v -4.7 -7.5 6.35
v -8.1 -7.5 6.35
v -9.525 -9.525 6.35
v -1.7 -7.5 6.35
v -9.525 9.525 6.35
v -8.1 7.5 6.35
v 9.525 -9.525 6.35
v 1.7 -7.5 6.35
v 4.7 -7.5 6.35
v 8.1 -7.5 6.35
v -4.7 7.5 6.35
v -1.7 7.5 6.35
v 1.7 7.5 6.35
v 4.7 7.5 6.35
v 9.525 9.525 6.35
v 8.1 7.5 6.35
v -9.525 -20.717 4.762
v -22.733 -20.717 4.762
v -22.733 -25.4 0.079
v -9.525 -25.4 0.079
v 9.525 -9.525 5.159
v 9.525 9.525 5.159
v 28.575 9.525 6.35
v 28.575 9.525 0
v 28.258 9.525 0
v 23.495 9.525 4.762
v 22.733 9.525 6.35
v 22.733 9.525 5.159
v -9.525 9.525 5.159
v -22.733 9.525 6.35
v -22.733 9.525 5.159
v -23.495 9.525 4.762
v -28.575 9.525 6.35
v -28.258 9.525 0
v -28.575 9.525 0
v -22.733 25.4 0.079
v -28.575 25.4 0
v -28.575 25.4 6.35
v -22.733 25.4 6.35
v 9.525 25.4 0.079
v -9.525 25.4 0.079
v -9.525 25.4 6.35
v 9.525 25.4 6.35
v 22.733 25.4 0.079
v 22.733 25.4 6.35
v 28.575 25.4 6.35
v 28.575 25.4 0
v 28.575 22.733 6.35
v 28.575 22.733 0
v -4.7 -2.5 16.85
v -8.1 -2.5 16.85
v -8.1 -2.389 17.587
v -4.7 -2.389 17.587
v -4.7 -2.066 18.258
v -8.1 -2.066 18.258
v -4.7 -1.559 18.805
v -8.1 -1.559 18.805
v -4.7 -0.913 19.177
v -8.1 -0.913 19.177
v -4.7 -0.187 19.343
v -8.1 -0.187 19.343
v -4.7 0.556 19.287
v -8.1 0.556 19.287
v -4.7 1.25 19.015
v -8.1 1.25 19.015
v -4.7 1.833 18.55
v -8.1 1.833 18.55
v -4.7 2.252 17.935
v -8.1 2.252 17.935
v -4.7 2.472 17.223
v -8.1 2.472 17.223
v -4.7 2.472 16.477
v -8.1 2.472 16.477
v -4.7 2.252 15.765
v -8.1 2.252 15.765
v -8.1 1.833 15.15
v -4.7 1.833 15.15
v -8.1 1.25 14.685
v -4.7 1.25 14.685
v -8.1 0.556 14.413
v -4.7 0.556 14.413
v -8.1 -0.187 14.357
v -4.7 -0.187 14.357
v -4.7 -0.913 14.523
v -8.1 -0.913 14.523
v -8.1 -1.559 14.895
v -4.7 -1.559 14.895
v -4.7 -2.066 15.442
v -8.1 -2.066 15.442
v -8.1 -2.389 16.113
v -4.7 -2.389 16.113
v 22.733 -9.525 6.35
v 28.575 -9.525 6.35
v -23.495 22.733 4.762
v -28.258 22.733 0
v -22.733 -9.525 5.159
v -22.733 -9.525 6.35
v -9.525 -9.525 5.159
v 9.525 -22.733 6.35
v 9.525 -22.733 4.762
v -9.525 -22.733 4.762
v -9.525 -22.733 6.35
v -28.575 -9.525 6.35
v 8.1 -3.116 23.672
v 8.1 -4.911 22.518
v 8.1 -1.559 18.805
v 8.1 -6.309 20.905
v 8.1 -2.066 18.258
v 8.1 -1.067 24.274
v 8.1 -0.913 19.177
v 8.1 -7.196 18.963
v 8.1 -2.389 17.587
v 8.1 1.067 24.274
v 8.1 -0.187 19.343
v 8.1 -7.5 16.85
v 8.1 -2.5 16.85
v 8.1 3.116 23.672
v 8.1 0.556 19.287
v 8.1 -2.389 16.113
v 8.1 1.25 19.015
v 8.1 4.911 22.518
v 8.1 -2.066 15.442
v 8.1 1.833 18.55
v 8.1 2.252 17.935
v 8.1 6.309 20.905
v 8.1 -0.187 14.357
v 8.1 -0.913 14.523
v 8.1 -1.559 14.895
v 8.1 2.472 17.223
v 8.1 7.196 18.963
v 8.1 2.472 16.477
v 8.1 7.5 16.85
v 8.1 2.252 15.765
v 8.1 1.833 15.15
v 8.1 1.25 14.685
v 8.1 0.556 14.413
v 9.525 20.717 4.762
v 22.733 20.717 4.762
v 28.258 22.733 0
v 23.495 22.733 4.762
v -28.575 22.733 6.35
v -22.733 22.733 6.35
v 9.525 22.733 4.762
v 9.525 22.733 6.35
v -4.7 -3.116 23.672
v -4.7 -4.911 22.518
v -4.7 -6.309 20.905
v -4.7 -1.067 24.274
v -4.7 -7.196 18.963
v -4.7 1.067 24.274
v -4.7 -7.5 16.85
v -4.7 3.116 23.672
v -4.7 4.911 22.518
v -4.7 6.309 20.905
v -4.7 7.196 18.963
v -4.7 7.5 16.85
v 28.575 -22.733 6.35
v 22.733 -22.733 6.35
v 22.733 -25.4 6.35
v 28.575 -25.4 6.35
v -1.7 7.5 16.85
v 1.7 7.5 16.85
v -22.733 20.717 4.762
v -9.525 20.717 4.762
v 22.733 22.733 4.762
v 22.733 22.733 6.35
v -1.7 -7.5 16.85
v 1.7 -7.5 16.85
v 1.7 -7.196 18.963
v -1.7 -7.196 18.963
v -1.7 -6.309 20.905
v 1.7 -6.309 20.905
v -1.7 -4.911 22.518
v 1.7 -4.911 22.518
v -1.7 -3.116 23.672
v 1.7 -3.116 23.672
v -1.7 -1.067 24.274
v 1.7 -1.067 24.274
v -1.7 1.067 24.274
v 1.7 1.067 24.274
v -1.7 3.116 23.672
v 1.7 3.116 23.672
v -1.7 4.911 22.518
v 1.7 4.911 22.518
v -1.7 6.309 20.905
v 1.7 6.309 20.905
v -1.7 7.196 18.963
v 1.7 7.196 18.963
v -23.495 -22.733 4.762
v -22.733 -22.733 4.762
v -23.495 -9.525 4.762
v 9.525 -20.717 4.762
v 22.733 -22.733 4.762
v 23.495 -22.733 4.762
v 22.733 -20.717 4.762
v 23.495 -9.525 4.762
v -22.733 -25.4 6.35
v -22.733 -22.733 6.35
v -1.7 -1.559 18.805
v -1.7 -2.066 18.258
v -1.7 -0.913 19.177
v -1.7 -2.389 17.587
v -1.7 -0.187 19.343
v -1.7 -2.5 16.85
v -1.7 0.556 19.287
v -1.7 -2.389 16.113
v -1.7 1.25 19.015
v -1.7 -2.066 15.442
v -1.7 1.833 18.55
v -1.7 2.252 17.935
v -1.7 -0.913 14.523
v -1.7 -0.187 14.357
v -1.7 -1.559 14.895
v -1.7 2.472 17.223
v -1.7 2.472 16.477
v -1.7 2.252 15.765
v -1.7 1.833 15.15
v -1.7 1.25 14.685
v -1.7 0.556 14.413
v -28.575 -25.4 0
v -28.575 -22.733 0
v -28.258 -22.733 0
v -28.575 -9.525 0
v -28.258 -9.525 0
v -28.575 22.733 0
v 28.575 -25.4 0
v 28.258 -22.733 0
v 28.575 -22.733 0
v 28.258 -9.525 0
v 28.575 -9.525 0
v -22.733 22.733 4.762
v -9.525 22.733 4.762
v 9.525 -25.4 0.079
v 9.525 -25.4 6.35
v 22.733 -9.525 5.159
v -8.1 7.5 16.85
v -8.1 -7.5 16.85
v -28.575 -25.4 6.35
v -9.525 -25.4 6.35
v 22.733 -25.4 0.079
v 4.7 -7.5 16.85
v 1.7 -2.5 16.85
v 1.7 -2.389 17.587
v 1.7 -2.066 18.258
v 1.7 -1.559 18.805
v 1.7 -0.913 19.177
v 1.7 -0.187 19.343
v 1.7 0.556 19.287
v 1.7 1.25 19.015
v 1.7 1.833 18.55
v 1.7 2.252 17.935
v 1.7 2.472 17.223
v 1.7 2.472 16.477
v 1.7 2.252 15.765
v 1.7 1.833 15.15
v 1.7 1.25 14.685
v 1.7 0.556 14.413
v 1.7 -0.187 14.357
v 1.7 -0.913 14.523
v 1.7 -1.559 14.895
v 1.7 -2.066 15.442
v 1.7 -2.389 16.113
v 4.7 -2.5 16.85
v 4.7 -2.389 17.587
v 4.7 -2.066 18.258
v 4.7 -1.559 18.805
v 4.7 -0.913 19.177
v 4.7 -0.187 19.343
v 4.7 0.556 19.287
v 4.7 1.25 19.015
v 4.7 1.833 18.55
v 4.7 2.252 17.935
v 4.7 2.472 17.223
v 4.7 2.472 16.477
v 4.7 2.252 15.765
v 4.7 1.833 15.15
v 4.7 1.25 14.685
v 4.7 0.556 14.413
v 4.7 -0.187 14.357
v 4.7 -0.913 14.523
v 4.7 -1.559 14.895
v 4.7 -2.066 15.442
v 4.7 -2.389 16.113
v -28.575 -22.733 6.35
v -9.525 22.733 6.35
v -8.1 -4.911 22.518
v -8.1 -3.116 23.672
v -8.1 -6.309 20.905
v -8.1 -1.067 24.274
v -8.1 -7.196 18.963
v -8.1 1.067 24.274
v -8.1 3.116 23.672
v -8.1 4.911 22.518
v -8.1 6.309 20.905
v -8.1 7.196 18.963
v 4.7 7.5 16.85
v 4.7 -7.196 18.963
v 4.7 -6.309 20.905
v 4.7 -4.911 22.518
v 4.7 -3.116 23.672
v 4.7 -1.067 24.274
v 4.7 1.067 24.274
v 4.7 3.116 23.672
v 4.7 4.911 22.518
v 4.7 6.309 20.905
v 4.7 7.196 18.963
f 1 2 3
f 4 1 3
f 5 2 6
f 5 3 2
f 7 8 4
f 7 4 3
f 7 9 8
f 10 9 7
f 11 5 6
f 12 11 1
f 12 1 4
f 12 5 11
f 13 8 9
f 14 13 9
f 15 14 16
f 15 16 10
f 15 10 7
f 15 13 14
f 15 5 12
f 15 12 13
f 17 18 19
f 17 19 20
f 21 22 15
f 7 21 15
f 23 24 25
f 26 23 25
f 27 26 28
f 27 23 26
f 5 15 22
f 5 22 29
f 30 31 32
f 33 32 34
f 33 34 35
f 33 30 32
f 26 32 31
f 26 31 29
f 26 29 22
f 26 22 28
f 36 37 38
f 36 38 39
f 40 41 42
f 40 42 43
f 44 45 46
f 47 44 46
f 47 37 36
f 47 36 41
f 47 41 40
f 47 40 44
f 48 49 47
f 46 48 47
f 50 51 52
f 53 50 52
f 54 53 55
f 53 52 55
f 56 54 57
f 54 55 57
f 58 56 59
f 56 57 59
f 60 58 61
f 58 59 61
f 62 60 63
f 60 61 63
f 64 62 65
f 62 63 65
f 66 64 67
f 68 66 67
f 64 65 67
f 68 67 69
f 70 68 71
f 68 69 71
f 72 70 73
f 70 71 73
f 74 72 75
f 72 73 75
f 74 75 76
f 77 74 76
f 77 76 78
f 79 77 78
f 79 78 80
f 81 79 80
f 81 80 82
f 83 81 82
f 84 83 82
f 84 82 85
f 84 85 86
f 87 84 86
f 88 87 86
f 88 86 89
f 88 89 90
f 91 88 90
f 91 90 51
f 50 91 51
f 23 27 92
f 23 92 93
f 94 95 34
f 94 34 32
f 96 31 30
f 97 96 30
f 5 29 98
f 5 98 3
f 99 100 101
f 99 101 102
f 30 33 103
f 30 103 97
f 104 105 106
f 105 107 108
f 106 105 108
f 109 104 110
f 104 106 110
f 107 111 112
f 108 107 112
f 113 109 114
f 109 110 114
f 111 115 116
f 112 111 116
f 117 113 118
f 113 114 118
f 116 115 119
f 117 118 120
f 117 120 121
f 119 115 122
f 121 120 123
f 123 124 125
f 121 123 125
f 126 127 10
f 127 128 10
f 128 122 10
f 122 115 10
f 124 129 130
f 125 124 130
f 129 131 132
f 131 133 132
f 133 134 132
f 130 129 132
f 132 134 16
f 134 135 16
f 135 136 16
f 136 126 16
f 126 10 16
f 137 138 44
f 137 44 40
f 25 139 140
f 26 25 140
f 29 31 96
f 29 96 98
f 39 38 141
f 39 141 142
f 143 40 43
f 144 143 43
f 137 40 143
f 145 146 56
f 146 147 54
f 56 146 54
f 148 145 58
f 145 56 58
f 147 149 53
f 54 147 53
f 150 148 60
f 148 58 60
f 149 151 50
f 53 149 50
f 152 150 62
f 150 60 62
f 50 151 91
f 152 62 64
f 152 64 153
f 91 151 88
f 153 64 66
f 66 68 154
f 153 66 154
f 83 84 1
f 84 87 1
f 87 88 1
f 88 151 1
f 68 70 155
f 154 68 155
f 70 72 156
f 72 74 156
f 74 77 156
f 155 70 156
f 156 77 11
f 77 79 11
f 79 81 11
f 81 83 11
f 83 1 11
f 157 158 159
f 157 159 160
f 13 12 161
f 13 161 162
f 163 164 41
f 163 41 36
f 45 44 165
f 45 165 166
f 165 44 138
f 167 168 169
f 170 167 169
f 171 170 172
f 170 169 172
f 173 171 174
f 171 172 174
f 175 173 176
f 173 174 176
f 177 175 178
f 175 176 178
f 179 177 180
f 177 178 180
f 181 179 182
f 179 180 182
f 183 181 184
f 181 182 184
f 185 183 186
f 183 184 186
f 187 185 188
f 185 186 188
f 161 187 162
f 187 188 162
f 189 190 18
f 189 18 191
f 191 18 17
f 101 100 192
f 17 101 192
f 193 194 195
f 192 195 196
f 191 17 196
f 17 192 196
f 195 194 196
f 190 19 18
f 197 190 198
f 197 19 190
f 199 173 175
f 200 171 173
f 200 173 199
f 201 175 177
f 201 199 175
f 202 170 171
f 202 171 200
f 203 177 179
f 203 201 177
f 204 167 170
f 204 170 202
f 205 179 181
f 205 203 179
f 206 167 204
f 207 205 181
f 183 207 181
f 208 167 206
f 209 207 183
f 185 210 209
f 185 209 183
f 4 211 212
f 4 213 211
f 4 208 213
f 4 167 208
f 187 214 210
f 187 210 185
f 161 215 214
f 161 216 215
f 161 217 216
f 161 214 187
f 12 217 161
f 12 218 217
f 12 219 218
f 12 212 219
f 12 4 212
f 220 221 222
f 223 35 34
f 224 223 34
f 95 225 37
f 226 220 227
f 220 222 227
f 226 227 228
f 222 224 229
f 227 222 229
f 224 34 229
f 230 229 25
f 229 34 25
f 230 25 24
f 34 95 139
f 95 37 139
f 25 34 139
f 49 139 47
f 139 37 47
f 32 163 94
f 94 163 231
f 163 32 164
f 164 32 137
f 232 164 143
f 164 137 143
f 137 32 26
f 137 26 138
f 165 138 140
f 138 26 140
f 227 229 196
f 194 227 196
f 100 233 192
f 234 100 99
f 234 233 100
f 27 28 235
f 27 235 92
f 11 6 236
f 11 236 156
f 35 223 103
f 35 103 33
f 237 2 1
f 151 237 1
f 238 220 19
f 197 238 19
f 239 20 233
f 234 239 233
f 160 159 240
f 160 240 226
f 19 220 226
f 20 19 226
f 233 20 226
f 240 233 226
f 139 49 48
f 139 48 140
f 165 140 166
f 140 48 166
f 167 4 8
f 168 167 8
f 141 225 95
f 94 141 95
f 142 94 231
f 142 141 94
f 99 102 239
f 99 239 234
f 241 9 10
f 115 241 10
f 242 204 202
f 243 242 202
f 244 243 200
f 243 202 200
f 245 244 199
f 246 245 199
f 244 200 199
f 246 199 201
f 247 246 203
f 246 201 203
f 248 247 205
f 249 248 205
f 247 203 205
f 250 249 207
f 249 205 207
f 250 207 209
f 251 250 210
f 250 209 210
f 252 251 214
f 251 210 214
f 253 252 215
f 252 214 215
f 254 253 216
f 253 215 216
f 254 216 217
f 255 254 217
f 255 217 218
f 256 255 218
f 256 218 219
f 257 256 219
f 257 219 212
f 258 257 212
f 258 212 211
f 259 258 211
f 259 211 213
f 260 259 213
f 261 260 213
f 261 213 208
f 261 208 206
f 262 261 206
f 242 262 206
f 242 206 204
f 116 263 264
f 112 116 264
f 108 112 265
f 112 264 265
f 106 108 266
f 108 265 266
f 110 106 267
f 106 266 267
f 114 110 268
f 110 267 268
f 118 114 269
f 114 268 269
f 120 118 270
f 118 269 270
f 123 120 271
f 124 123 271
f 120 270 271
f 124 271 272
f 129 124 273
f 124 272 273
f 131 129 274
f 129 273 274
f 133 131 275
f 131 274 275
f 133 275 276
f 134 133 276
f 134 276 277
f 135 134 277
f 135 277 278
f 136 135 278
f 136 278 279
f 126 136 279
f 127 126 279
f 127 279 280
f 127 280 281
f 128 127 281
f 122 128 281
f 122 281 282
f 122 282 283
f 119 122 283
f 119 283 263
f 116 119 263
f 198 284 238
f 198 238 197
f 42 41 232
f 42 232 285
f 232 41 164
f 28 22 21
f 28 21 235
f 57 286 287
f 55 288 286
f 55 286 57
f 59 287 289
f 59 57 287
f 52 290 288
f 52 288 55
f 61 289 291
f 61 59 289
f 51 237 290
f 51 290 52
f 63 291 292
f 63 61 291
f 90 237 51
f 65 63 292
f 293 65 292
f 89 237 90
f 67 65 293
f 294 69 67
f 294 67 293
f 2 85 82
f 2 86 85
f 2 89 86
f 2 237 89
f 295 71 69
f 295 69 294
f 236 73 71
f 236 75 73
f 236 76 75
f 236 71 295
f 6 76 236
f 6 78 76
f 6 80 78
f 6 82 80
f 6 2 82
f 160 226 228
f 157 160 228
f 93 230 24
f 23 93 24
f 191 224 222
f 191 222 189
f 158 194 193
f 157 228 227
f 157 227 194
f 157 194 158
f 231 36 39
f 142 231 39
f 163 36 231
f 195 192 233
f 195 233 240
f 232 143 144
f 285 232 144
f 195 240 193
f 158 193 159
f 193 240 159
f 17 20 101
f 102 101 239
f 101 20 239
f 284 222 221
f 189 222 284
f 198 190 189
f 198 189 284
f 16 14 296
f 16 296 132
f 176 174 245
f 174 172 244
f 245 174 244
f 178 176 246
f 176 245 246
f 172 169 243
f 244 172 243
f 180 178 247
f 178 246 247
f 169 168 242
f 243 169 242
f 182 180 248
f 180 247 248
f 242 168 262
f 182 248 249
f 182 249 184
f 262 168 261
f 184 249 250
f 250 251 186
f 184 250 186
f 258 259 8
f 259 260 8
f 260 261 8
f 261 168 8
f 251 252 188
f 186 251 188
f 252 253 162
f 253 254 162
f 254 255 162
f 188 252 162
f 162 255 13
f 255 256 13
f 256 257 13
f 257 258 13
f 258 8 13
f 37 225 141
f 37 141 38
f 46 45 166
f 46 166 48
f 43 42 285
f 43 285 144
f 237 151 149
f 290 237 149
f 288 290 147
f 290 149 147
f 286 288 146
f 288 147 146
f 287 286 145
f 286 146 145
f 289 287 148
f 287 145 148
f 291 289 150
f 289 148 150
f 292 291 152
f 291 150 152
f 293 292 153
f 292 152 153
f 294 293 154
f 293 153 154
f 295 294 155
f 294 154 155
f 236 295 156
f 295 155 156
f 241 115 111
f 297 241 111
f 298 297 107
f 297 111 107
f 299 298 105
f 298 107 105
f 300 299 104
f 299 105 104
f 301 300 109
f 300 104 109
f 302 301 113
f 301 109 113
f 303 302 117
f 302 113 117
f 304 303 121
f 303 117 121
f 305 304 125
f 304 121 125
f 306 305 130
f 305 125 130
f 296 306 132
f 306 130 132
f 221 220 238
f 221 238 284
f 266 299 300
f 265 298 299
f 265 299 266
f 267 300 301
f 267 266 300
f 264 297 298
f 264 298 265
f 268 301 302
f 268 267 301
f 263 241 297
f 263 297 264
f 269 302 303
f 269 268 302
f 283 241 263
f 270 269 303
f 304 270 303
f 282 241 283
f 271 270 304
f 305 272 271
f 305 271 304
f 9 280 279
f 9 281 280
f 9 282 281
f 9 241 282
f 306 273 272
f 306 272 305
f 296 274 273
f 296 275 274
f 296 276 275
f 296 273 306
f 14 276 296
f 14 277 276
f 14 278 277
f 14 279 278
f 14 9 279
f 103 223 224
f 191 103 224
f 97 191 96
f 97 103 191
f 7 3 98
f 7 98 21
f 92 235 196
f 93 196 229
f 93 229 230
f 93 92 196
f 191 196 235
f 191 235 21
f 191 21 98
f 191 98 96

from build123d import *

# Parameters (mm, degrees)
F0_W        = 57.15
F0_H        = 50.8
F1_DEPTH    = 6.35
F2_W        = 13.208
F2_H        = 1.190625
F3_DEPTH    = 50.801
F4_SIZE     = 5.08
F5_W        = 3.4
F5_H        = 15
F6_DEPTH    = 18
F7_W        = 13.208
F7_H        = 1.5875
F8_DEPTH    = 57.151
F9_T1_DEPTH = 13.208
F9_T3_DEPTH = 13.208
F11_D       = 5
F12_DEPTH   = 36.676


# Not quite as in the source:
# - a fillet or chamfer that OpenCascade refuses, or shapes differently, is made with other operations: its cross-section is extruded or revolved along the edge and cut away or added


with BuildPart() as f1:
    # F0 (on Top) → F1 (new body)
    with BuildSketch(Plane.XY):
        Rectangle(F0_W, F0_H)
    extrude(amount=F1_DEPTH)

    # F2 (on face) → F3 (cut, through all)
    with BuildSketch(Plane.XZ.offset(25.4)):
        with Locations((-16.129, 5.7546875)):
            Rectangle(F2_W, F2_H)
        with Locations((16.129, 5.7546875)):
            Rectangle(F2_W, F2_H)
    extrude(amount=-F3_DEPTH, mode=Mode.SUBTRACT)

    # F4
    f4_edges = [f1.edges().sort_by_distance(p)[0] for p in [
        (-16.129, -25.4, 5.159375),
        (16.129, -25.4, 5.159375),
        (-16.129, 25.4, 5.159375),
        (16.129, 25.4, 5.159375),
    ]]
    chamfer(f4_edges, length=F4_SIZE)

    # F5 (on face) → F6 (join)
    with BuildSketch(Plane.XY.offset(6.35)):
        Rectangle(F5_W, F5_H)
        with Locations((6.4, 0)):
            Rectangle(F5_W, F5_H)
        with Locations((-6.4, 0)):
            Rectangle(F5_W, F5_H)
    extrude(amount=F6_DEPTH)

    # F7 (on face) → F8 (cut, through all)
    with BuildSketch(Plane.YZ.offset(28.575)):
        with Locations((-16.129, 5.55625)):
            Rectangle(F7_W, F7_H)
        with Locations((16.129, 5.55625)):
            Rectangle(F7_W, F7_H)
    extrude(amount=-F8_DEPTH, mode=Mode.SUBTRACT)

    # F9: chamfer of 5.08 on 4 edges, made by hand

    # F9_s2 → F9_t1 (cut)
    with BuildSketch(Plane.XZ.offset(-22.733)):
        Polygon((28.575, -0.3175), (23.495, 4.7625), (28.575, 4.7625), align=None)
        Polygon((-28.575, -0.3175), (-23.495, 4.7625), (-28.575, 4.7625), align=None)
    extrude(amount=F9_T1_DEPTH, mode=Mode.SUBTRACT)

    # F9_s4 → F9_t3 (cut)
    with BuildSketch(Plane.XZ.offset(9.525)):
        Polygon((28.575, -0.3175), (23.495, 4.7625), (28.575, 4.7625), align=None)
        Polygon((-28.575, -0.3175), (-23.495, 4.7625), (-28.575, 4.7625), align=None)
    extrude(amount=F9_T3_DEPTH, mode=Mode.SUBTRACT)

    # F11 (through all)
    with Locations(Plane.YZ.offset(8.1)):
        with Locations((0, 16.85)):
            Hole(F11_D / 2)

    # F10 (on face) → F12 (cut, through all)
    with BuildSketch(Plane.YZ.offset(8.1)):
        with BuildLine():
            Line((-7.5, 24.35), (-7.5, 16.85))
            ThreePointArc((-7.5, 16.85), (-5.3033008589, 22.1533008589), (0, 24.35))
            Line((0, 24.35), (-7.5, 24.35))
        make_face()
        with BuildLine():
            Line((7.5, 24.35), (0, 24.35))
            ThreePointArc((0, 24.35), (5.3033008589, 22.1533008589), (7.5, 16.85))
            Line((7.5, 16.85), (7.5, 24.35))
        make_face()
    extrude(amount=-F12_DEPTH, mode=Mode.SUBTRACT)


solid = f1.part
